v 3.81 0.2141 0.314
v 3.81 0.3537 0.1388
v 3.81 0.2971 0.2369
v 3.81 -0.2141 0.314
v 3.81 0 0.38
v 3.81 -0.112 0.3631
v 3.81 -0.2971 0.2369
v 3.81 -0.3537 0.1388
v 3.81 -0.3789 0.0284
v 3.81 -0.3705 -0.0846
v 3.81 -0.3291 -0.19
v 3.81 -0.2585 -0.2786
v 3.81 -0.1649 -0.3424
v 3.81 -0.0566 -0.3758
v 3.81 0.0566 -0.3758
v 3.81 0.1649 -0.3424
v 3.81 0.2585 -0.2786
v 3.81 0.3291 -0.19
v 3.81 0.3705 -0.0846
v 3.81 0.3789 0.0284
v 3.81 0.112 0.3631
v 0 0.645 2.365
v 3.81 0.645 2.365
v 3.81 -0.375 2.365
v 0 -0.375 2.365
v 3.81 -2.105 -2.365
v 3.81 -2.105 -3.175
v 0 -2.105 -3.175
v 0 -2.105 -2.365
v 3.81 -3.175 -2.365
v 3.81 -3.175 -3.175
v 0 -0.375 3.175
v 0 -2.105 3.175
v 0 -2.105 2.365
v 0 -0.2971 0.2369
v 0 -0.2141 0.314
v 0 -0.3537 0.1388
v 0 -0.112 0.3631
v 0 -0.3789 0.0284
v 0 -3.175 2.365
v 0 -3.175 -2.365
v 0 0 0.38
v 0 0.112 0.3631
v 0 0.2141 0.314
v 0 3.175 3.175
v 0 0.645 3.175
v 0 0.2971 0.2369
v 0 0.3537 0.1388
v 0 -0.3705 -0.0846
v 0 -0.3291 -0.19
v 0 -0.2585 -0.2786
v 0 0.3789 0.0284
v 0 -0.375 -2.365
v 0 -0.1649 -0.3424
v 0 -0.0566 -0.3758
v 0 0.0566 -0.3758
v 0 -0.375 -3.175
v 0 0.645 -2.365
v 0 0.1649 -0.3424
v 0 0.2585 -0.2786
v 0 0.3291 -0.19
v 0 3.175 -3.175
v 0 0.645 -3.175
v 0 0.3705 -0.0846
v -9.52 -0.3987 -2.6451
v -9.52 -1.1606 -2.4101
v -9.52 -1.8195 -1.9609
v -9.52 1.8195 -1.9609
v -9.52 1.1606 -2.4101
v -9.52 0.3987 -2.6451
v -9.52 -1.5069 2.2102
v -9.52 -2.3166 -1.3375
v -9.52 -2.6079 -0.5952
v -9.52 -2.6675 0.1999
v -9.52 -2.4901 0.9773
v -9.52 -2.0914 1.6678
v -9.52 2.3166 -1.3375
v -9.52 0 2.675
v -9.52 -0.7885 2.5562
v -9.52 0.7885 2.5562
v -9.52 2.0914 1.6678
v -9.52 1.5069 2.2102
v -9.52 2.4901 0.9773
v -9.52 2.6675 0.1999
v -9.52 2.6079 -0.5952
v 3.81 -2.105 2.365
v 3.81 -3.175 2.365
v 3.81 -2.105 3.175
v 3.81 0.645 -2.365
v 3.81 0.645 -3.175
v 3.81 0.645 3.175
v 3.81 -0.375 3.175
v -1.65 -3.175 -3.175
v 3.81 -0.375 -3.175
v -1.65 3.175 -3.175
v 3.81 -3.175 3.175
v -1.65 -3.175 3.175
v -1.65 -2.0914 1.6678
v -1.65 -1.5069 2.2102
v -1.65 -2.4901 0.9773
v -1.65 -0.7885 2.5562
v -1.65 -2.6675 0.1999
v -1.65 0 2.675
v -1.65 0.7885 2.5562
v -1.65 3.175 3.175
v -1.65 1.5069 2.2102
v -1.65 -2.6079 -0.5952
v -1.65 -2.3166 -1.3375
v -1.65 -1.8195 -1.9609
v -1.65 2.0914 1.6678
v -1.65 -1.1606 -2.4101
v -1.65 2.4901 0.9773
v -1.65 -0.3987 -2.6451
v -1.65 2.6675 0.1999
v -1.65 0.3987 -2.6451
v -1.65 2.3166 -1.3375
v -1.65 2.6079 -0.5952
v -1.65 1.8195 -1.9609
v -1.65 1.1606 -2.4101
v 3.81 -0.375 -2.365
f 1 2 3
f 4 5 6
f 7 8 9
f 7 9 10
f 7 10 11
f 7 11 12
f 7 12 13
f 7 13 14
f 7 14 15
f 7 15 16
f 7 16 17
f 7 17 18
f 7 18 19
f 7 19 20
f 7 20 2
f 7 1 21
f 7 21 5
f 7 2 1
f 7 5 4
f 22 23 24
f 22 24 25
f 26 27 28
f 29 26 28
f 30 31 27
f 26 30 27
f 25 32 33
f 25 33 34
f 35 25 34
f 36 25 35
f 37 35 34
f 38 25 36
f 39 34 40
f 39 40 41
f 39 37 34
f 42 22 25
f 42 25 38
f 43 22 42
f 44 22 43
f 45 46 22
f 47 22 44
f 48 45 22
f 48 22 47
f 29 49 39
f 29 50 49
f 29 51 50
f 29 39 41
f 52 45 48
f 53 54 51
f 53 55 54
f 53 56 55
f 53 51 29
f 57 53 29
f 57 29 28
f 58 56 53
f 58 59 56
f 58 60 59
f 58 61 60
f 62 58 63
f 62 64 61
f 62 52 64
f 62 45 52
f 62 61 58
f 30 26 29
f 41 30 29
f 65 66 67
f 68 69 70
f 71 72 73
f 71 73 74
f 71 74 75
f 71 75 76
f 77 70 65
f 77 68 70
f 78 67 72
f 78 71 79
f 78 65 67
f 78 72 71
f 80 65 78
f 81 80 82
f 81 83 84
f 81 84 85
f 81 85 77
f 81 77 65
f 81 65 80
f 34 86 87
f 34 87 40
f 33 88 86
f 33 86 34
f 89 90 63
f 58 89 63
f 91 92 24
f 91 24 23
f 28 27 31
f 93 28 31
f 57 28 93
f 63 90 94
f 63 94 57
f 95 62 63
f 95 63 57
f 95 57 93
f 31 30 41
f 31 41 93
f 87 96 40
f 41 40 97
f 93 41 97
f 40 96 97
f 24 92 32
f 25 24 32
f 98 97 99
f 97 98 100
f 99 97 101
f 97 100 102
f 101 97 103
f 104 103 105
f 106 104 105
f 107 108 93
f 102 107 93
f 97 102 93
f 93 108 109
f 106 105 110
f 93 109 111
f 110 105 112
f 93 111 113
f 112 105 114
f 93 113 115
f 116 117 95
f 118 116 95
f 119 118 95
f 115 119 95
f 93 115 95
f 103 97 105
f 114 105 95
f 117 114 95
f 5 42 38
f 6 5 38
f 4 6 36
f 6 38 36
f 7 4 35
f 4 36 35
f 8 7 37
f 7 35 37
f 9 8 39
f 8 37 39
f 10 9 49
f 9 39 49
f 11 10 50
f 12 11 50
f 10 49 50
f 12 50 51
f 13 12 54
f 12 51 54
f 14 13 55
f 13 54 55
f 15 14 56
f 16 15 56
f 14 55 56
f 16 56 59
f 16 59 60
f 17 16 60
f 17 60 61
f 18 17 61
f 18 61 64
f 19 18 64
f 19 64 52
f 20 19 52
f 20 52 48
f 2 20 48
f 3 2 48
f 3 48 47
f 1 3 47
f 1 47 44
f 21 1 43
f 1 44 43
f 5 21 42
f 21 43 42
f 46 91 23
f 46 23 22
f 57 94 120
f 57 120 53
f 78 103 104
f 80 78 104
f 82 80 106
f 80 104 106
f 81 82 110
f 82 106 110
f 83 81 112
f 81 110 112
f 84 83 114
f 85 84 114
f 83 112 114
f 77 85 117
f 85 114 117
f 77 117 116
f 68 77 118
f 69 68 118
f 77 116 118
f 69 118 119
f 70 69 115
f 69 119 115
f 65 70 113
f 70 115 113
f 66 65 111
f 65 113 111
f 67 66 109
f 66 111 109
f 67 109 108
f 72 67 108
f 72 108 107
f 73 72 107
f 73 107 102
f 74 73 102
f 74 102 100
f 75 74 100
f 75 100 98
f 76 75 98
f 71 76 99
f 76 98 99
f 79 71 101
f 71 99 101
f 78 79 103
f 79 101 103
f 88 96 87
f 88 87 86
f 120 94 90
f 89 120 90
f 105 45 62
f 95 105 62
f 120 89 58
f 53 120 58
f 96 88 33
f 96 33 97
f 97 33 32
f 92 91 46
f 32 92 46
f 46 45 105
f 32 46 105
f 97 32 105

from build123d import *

# Parameters (mm, degrees)
SKETCH1_W           = 6.35
SKETCH1_H           = 6.35
BOSS_EXTRUDE1_DEPTH = 1.65
SKETCH2_W           = 3.81
SKETCH2_H           = 1.07
SKETCH2_H_2         = 1.02
BOSS_EXTRUDE2_DEPTH = 0.81
SKETCH3_R           = 0.38
BOSS_EXTRUDE3_DEPTH = 3.81
SKETCH4_R           = 2.675
BOSS_EXTRUDE4_DEPTH = 7.87


with BuildPart() as part:
    # Sketch1 → Boss-Extrude1 (new body)
    with BuildSketch(Plane(origin=(0, 0, 0), x_dir=(0, 0, -1), z_dir=(1, 0, 0))):
        Rectangle(SKETCH1_W, SKETCH1_H)
    extrude(amount=-BOSS_EXTRUDE1_DEPTH)

    # Sketch2 → Boss-Extrude2 (add)
    with BuildSketch(Plane(origin=(0, 0, -3.175), x_dir=(-1, 0, 0), z_dir=(0, 0, -1))):
        with Locations((-1.905, -2.64)):
            Rectangle(SKETCH2_W, SKETCH2_H)
        with Locations((-1.905, 0.135)):
            Rectangle(SKETCH2_W, SKETCH2_H_2)
    boss_extrude2 = extrude(amount=-BOSS_EXTRUDE2_DEPTH)

    # Mirror1: Boss-Extrude2 across plane
    add(boss_extrude2.mirror(Plane.XY))

    # Sketch3 → Boss-Extrude3 (add)
    with BuildSketch(Plane(origin=(0, 0, 0), x_dir=(0, 0, -1), z_dir=(1, 0, 0))):
        with Locations(Location((0, 0, 0), (0, 0, 180))):  # turned: the seam where the file's is
            Circle(SKETCH3_R)
    extrude(amount=BOSS_EXTRUDE3_DEPTH)

    # Sketch4 → Boss-Extrude4 (add)
    with BuildSketch(Plane.ZY.offset(1.65)):
        Circle(SKETCH4_R)
    extrude(amount=BOSS_EXTRUDE4_DEPTH)


solid = part.part
